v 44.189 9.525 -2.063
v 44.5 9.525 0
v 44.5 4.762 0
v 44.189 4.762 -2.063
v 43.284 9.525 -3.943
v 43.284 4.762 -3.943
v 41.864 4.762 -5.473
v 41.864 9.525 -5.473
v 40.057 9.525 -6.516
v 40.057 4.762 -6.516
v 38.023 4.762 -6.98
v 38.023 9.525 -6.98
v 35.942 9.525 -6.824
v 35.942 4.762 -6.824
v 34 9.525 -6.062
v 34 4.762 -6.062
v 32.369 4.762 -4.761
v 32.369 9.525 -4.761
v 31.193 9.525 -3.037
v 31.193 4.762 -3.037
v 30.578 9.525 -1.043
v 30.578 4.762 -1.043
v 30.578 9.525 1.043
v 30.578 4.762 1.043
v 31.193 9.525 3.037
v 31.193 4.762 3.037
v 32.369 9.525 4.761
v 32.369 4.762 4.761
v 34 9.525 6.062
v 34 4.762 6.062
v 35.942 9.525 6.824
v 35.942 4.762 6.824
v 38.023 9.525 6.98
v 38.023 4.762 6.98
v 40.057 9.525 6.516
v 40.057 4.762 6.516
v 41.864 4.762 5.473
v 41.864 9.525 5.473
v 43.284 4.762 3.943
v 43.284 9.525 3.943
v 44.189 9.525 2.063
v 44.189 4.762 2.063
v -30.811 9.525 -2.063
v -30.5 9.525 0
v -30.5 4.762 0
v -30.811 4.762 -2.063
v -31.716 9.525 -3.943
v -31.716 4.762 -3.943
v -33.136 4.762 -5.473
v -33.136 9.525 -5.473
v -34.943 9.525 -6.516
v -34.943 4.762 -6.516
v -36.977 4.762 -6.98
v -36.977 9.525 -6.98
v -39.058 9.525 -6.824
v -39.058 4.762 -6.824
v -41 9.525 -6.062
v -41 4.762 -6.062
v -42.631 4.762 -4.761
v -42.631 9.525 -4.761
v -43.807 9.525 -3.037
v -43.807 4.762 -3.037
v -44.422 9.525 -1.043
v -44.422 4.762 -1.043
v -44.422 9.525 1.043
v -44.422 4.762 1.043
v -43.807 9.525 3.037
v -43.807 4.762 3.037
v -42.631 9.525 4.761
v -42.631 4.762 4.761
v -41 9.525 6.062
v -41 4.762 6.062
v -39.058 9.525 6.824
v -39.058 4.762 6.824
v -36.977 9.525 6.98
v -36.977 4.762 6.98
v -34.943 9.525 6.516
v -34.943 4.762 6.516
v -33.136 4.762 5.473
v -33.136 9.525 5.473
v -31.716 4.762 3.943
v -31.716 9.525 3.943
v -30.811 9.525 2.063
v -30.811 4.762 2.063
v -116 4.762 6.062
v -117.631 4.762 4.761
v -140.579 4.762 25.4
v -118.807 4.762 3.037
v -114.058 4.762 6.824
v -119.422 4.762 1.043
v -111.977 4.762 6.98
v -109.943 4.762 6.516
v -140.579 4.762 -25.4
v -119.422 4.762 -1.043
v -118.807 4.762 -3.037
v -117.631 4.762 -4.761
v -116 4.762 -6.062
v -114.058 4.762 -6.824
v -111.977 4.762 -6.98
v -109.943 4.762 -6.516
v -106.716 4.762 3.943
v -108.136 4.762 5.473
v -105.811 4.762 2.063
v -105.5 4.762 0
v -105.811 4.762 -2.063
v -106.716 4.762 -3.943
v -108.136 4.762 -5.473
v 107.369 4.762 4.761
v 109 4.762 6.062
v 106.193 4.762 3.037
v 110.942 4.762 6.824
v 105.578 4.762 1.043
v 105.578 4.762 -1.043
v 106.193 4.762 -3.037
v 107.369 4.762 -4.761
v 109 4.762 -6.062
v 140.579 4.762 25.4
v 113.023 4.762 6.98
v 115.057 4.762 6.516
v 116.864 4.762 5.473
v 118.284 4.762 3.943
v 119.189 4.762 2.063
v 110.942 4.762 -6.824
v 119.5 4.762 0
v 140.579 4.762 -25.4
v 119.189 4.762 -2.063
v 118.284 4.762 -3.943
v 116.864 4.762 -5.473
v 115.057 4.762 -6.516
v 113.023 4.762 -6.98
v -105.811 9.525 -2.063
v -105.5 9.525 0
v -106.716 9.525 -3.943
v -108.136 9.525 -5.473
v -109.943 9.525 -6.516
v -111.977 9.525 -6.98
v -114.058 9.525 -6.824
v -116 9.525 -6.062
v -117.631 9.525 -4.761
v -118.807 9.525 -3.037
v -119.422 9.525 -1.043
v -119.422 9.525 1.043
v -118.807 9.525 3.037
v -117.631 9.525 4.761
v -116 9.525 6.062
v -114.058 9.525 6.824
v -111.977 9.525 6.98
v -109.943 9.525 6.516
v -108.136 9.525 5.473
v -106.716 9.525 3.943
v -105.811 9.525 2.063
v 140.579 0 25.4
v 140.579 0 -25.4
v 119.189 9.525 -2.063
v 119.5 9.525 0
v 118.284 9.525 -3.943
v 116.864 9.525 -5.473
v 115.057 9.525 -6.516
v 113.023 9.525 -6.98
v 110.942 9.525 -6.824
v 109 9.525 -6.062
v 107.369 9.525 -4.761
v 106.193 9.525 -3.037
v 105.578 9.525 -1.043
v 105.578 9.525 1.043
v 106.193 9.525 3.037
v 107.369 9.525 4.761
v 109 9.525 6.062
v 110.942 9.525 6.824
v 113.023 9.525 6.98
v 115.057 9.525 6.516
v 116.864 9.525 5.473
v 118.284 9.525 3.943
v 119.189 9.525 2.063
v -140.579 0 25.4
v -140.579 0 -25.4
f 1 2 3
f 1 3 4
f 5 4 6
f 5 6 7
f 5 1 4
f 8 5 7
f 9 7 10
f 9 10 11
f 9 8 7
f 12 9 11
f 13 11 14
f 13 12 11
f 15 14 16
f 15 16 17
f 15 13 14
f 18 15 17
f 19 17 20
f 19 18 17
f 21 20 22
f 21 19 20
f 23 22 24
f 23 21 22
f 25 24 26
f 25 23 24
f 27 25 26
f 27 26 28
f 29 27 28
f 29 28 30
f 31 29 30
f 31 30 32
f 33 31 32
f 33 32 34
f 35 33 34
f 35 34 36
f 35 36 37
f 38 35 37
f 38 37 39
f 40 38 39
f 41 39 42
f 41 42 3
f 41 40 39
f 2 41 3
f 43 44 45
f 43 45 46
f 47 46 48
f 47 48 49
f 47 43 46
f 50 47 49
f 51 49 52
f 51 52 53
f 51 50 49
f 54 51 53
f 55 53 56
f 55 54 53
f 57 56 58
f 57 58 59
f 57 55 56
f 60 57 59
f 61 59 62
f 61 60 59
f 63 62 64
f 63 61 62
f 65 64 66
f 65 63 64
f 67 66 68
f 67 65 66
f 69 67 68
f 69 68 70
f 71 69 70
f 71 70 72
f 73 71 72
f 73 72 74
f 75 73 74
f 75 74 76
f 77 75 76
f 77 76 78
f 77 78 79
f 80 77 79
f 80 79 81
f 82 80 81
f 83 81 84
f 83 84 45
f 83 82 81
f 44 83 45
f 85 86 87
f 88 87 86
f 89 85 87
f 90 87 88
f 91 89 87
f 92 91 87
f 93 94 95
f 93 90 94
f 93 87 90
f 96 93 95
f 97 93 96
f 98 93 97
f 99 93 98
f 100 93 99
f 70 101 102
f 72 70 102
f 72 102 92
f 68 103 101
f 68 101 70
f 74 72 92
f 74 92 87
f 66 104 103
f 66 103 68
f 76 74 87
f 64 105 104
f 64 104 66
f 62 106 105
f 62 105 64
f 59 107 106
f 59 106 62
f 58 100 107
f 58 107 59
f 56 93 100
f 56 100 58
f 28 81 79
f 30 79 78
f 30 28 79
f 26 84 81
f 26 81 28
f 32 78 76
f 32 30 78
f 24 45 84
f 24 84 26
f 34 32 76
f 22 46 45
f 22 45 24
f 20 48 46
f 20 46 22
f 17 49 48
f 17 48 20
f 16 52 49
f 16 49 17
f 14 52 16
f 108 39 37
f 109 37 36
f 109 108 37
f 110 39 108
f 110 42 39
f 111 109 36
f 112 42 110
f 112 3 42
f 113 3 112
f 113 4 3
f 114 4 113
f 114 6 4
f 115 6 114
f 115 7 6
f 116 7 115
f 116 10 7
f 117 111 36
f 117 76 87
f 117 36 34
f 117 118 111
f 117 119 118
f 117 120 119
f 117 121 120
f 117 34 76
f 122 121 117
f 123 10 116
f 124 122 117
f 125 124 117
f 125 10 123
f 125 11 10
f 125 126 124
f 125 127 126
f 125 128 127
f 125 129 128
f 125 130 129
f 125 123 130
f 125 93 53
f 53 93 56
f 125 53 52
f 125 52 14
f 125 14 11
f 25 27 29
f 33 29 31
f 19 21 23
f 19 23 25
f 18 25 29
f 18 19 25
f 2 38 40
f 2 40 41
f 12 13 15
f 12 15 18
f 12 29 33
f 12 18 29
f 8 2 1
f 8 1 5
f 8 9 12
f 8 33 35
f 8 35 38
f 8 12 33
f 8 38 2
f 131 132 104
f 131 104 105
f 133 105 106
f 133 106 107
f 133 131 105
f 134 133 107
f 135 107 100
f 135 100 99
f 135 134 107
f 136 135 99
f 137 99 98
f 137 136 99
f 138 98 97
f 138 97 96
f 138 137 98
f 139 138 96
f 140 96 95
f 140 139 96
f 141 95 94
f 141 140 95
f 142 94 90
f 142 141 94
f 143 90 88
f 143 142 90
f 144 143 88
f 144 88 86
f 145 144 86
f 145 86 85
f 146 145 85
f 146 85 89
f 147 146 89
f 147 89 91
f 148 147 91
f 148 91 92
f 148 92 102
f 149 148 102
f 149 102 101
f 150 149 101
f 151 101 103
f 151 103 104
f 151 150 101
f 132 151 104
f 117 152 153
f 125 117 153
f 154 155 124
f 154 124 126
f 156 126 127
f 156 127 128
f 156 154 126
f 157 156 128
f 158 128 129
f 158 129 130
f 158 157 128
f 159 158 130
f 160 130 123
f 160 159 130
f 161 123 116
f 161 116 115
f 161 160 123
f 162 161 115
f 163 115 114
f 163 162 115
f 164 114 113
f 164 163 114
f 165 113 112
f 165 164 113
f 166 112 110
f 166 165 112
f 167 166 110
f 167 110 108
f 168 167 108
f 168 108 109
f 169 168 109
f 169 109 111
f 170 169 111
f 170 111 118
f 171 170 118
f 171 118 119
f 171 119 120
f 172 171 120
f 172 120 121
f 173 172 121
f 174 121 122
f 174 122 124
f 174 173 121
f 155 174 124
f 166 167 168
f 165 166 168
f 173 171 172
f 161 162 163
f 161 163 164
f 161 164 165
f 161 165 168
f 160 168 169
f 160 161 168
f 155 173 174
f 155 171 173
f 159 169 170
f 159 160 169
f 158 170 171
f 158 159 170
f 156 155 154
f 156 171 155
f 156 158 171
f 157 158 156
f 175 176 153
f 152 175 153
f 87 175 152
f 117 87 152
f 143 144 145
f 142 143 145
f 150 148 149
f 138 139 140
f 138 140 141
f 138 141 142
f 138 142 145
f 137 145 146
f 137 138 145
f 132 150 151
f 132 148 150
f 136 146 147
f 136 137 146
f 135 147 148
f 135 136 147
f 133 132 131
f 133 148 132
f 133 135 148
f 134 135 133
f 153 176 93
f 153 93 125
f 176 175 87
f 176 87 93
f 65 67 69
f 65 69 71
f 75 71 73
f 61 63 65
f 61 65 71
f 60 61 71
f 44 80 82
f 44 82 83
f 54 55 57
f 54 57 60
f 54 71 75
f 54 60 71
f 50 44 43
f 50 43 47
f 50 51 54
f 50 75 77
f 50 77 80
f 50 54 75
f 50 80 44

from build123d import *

# Parameters (mm, degrees)
SKETCH1_W           = 281.158896912
SKETCH1_H           = 50.8
BOSS_EXTRUDE1_DEPTH = 9.525
SKETCH2_OUTSIDE_W   = 340.332
SKETCH2_OUTSIDE_H   = 109.974
SKETCH2_OUTSIDE_R   = 7
CUT_EXTRUDE1_DEPTH  = 4.7625


with BuildPart() as part:
    # Sketch1 → Boss-Extrude1 (new body)
    with BuildSketch(Plane(origin=(0, 0, 0), x_dir=(1, 0, 0), z_dir=(0, 1, 0))):
        Rectangle(SKETCH1_W, SKETCH1_H)
    extrude(amount=BOSS_EXTRUDE1_DEPTH)

    # Sketch2 outside → Cut-Extrude1 (cut)
    with BuildSketch(Plane(origin=(0, 9.525, 0), x_dir=(1, 0, 0), z_dir=(0, 1, 0))):
        Rectangle(SKETCH2_OUTSIDE_W, SKETCH2_OUTSIDE_H)
        with Locations((-112.5, 0)):
            Circle(SKETCH2_OUTSIDE_R, mode=Mode.SUBTRACT)
        with Locations((-37.5, 0)):
            Circle(SKETCH2_OUTSIDE_R, mode=Mode.SUBTRACT)
        with Locations((37.5, 0)):
            Circle(SKETCH2_OUTSIDE_R, mode=Mode.SUBTRACT)
        with Locations((112.5, 0)):
            Circle(SKETCH2_OUTSIDE_R, mode=Mode.SUBTRACT)
    extrude(amount=-CUT_EXTRUDE1_DEPTH, mode=Mode.SUBTRACT)


solid = part.part
